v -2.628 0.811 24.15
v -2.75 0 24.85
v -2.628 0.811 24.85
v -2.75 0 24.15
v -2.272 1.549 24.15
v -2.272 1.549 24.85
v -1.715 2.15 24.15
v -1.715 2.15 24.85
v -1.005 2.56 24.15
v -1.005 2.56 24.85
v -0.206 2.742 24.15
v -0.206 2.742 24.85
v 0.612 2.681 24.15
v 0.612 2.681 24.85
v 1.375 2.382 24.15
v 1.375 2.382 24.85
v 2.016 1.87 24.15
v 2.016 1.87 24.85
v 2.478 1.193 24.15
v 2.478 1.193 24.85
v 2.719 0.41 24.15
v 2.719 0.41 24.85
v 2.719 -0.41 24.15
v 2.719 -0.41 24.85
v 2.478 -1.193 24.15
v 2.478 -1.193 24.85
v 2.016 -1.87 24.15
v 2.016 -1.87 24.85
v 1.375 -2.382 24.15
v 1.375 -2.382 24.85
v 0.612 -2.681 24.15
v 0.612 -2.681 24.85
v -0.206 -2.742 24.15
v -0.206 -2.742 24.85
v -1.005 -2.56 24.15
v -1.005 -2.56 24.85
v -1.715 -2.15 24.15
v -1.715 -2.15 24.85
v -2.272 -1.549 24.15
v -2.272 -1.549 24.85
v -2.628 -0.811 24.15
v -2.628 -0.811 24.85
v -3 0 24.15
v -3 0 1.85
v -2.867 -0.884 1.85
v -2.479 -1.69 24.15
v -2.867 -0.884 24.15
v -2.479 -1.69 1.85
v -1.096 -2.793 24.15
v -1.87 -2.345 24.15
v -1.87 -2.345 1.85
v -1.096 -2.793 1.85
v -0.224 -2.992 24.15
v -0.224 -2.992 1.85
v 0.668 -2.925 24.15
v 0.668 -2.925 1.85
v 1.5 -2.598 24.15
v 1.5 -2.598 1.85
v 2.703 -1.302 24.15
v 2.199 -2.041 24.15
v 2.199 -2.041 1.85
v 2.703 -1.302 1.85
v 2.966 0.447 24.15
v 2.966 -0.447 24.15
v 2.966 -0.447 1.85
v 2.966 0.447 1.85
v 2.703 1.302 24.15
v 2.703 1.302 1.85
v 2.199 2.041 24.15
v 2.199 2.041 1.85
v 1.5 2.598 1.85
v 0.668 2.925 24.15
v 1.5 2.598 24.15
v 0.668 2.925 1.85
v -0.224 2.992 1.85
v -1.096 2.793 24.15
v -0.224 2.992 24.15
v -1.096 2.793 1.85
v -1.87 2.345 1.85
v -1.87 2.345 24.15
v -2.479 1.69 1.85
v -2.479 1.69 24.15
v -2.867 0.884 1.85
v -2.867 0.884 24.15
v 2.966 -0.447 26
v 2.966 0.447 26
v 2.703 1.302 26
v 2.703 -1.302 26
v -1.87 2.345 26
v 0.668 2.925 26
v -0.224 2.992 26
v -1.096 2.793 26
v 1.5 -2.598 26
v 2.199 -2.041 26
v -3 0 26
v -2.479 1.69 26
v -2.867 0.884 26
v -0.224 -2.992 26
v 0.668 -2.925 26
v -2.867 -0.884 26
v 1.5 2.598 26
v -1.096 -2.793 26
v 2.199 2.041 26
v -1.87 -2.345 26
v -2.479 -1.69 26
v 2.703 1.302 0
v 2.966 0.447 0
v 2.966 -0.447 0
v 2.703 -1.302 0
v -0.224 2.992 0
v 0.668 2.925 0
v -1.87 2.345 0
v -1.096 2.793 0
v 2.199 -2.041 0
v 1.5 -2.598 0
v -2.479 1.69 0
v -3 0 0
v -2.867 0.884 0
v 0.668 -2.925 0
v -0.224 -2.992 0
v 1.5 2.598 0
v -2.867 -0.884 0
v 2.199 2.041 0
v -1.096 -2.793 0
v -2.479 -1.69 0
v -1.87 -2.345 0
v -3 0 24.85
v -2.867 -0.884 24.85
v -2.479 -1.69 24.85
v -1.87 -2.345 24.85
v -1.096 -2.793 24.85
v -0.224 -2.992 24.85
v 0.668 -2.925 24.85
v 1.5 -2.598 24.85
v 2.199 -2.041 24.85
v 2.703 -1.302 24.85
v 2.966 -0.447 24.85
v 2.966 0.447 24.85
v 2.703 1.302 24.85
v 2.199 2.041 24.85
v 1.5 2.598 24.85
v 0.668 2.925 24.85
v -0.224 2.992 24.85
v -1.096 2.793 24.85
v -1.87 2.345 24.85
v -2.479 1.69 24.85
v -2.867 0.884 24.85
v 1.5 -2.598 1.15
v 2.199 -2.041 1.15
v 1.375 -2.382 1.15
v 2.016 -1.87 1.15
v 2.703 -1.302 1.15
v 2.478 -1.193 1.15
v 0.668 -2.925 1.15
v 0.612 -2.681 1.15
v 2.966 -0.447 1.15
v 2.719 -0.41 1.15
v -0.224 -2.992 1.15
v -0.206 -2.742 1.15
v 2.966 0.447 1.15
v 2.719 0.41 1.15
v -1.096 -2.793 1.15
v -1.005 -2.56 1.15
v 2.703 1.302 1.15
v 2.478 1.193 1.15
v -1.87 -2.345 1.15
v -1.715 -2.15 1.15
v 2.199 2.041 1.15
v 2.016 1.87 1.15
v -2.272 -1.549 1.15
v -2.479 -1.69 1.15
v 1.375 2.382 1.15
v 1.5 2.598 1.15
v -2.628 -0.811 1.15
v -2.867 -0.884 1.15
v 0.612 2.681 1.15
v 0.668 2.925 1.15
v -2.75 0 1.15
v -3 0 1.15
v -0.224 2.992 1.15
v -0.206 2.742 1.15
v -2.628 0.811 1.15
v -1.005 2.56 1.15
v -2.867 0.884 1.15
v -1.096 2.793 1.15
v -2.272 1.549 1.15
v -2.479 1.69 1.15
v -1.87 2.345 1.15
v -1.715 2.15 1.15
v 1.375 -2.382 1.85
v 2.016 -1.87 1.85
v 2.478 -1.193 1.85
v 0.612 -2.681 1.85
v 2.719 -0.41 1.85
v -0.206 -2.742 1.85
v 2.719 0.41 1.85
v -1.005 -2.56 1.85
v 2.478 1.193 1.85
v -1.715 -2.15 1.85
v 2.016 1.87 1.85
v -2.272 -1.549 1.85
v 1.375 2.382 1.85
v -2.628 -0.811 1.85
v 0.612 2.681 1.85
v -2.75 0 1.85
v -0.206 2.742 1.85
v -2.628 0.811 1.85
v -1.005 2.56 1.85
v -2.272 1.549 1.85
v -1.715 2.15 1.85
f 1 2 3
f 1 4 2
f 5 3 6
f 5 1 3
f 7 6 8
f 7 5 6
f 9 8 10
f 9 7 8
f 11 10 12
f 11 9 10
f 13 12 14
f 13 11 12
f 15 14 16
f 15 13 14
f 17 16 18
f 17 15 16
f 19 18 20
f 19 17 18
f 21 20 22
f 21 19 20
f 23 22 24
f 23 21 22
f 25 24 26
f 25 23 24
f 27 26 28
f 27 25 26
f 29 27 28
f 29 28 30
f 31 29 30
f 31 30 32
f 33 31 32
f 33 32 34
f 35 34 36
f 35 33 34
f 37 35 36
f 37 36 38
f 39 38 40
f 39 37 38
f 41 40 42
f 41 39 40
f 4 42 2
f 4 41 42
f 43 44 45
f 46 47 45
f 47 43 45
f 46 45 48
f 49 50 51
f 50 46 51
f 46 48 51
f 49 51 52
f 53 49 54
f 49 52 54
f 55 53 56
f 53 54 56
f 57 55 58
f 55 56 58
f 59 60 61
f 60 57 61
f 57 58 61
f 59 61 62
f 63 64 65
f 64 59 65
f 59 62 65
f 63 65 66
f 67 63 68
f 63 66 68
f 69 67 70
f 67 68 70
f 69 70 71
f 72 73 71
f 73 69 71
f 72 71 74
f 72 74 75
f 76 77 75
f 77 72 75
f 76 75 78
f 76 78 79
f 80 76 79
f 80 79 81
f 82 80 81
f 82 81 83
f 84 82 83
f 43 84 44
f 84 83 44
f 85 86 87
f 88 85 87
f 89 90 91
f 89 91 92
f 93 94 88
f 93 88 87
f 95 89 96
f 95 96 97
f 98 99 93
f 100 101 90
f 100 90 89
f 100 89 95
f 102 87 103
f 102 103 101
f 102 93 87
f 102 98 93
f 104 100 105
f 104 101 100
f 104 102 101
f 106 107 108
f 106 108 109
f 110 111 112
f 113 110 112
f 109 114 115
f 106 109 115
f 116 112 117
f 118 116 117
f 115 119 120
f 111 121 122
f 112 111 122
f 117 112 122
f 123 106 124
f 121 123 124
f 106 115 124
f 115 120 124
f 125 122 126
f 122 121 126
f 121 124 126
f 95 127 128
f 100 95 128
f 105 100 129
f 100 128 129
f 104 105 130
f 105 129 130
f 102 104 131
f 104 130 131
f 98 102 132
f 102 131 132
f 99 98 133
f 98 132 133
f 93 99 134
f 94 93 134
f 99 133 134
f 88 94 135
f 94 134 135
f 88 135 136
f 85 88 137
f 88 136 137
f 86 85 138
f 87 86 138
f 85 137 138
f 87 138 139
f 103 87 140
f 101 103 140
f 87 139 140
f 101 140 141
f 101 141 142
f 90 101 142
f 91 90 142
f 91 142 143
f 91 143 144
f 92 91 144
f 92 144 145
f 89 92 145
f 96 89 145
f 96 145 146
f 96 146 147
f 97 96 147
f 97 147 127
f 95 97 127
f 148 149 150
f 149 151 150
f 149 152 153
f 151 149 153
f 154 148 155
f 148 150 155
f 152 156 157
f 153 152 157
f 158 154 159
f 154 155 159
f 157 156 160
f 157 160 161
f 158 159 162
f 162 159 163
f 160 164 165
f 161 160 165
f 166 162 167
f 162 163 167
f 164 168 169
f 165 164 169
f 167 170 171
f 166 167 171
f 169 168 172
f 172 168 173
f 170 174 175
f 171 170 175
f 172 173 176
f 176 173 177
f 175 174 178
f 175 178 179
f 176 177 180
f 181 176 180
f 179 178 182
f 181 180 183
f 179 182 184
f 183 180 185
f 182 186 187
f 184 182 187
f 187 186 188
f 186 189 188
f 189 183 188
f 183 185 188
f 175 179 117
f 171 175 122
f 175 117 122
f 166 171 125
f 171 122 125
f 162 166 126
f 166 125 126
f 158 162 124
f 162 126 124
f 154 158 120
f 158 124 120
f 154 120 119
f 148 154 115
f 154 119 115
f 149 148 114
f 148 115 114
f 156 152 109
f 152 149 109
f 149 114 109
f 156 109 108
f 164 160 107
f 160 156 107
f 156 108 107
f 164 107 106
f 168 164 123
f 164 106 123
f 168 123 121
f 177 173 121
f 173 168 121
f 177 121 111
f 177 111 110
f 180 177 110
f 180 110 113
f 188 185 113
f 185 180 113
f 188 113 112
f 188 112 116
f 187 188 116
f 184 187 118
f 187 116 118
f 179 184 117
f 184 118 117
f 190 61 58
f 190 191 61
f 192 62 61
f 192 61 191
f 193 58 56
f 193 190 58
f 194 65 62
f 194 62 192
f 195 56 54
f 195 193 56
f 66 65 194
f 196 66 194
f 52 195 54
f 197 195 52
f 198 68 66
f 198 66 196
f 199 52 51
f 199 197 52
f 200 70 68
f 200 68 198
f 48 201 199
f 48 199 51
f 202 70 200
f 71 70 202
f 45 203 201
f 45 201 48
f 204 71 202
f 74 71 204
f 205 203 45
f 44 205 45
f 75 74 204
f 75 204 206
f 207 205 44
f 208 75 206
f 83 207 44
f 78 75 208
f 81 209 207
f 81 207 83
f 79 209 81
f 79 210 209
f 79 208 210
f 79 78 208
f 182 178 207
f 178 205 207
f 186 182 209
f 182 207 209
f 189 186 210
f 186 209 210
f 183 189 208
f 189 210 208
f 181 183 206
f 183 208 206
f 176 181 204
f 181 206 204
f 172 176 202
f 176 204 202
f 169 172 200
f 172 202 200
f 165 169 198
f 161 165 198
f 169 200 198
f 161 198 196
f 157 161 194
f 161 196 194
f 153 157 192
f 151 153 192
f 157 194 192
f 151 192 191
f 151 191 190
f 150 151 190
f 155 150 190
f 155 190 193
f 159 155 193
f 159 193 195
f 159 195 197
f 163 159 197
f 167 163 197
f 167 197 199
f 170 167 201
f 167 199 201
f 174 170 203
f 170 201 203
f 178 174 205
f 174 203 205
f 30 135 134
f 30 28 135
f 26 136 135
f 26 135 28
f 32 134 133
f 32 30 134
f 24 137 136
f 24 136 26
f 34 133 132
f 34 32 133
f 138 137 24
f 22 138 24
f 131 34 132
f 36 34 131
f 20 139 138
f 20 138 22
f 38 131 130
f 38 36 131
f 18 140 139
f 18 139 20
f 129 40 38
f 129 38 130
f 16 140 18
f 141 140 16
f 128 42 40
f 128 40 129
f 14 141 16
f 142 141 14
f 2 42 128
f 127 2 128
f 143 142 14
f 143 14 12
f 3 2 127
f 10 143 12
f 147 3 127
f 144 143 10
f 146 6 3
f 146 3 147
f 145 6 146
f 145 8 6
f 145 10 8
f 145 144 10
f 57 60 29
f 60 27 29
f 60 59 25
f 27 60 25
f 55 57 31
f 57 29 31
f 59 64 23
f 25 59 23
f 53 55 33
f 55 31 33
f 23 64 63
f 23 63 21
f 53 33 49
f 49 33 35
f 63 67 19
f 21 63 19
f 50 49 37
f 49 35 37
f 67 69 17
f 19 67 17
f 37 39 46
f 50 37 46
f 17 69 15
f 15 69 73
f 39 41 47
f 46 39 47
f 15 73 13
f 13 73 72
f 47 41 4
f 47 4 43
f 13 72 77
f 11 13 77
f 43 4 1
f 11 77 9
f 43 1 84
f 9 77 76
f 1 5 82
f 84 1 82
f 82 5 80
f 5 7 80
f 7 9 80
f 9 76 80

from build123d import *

# Parameters (mm, degrees)
SKETCH_1_R          = 3
EXTRUDE_1_DEPTH     = 26
SKETCH_2_R          = 3
SKETCH_2_R_2        = 2.75
CUT_EXTRUDE_1_DEPTH = 0.35


with BuildPart() as part:
    # 스케치1 → 보스-돌출1 (new body)
    with BuildSketch(Plane.XY):
        with Locations(Location((0, 0, 0), (0, 0, 180))):
            Circle(SKETCH_1_R)
    extrude(amount=EXTRUDE_1_DEPTH)

    # 스케치2 → 컷-돌출1 (cut, symmetric)
    with BuildSketch(Plane(origin=(0, 0, 1.5), x_dir=(-1, 0, 0), z_dir=(0, 0, -1))):
        Circle(SKETCH_2_R)
        Circle(SKETCH_2_R_2, mode=Mode.SUBTRACT)
    cut_extrude_1 = extrude(amount=CUT_EXTRUDE_1_DEPTH, both=True, mode=Mode.SUBTRACT)

    # 대칭 복사1: 컷-돌출1 across plane
    add(cut_extrude_1.mirror(Plane(origin=(0, 0, 13), x_dir=(1, 0, 0), z_dir=(0, 0, -1))), mode=Mode.SUBTRACT)


solid = part.part
